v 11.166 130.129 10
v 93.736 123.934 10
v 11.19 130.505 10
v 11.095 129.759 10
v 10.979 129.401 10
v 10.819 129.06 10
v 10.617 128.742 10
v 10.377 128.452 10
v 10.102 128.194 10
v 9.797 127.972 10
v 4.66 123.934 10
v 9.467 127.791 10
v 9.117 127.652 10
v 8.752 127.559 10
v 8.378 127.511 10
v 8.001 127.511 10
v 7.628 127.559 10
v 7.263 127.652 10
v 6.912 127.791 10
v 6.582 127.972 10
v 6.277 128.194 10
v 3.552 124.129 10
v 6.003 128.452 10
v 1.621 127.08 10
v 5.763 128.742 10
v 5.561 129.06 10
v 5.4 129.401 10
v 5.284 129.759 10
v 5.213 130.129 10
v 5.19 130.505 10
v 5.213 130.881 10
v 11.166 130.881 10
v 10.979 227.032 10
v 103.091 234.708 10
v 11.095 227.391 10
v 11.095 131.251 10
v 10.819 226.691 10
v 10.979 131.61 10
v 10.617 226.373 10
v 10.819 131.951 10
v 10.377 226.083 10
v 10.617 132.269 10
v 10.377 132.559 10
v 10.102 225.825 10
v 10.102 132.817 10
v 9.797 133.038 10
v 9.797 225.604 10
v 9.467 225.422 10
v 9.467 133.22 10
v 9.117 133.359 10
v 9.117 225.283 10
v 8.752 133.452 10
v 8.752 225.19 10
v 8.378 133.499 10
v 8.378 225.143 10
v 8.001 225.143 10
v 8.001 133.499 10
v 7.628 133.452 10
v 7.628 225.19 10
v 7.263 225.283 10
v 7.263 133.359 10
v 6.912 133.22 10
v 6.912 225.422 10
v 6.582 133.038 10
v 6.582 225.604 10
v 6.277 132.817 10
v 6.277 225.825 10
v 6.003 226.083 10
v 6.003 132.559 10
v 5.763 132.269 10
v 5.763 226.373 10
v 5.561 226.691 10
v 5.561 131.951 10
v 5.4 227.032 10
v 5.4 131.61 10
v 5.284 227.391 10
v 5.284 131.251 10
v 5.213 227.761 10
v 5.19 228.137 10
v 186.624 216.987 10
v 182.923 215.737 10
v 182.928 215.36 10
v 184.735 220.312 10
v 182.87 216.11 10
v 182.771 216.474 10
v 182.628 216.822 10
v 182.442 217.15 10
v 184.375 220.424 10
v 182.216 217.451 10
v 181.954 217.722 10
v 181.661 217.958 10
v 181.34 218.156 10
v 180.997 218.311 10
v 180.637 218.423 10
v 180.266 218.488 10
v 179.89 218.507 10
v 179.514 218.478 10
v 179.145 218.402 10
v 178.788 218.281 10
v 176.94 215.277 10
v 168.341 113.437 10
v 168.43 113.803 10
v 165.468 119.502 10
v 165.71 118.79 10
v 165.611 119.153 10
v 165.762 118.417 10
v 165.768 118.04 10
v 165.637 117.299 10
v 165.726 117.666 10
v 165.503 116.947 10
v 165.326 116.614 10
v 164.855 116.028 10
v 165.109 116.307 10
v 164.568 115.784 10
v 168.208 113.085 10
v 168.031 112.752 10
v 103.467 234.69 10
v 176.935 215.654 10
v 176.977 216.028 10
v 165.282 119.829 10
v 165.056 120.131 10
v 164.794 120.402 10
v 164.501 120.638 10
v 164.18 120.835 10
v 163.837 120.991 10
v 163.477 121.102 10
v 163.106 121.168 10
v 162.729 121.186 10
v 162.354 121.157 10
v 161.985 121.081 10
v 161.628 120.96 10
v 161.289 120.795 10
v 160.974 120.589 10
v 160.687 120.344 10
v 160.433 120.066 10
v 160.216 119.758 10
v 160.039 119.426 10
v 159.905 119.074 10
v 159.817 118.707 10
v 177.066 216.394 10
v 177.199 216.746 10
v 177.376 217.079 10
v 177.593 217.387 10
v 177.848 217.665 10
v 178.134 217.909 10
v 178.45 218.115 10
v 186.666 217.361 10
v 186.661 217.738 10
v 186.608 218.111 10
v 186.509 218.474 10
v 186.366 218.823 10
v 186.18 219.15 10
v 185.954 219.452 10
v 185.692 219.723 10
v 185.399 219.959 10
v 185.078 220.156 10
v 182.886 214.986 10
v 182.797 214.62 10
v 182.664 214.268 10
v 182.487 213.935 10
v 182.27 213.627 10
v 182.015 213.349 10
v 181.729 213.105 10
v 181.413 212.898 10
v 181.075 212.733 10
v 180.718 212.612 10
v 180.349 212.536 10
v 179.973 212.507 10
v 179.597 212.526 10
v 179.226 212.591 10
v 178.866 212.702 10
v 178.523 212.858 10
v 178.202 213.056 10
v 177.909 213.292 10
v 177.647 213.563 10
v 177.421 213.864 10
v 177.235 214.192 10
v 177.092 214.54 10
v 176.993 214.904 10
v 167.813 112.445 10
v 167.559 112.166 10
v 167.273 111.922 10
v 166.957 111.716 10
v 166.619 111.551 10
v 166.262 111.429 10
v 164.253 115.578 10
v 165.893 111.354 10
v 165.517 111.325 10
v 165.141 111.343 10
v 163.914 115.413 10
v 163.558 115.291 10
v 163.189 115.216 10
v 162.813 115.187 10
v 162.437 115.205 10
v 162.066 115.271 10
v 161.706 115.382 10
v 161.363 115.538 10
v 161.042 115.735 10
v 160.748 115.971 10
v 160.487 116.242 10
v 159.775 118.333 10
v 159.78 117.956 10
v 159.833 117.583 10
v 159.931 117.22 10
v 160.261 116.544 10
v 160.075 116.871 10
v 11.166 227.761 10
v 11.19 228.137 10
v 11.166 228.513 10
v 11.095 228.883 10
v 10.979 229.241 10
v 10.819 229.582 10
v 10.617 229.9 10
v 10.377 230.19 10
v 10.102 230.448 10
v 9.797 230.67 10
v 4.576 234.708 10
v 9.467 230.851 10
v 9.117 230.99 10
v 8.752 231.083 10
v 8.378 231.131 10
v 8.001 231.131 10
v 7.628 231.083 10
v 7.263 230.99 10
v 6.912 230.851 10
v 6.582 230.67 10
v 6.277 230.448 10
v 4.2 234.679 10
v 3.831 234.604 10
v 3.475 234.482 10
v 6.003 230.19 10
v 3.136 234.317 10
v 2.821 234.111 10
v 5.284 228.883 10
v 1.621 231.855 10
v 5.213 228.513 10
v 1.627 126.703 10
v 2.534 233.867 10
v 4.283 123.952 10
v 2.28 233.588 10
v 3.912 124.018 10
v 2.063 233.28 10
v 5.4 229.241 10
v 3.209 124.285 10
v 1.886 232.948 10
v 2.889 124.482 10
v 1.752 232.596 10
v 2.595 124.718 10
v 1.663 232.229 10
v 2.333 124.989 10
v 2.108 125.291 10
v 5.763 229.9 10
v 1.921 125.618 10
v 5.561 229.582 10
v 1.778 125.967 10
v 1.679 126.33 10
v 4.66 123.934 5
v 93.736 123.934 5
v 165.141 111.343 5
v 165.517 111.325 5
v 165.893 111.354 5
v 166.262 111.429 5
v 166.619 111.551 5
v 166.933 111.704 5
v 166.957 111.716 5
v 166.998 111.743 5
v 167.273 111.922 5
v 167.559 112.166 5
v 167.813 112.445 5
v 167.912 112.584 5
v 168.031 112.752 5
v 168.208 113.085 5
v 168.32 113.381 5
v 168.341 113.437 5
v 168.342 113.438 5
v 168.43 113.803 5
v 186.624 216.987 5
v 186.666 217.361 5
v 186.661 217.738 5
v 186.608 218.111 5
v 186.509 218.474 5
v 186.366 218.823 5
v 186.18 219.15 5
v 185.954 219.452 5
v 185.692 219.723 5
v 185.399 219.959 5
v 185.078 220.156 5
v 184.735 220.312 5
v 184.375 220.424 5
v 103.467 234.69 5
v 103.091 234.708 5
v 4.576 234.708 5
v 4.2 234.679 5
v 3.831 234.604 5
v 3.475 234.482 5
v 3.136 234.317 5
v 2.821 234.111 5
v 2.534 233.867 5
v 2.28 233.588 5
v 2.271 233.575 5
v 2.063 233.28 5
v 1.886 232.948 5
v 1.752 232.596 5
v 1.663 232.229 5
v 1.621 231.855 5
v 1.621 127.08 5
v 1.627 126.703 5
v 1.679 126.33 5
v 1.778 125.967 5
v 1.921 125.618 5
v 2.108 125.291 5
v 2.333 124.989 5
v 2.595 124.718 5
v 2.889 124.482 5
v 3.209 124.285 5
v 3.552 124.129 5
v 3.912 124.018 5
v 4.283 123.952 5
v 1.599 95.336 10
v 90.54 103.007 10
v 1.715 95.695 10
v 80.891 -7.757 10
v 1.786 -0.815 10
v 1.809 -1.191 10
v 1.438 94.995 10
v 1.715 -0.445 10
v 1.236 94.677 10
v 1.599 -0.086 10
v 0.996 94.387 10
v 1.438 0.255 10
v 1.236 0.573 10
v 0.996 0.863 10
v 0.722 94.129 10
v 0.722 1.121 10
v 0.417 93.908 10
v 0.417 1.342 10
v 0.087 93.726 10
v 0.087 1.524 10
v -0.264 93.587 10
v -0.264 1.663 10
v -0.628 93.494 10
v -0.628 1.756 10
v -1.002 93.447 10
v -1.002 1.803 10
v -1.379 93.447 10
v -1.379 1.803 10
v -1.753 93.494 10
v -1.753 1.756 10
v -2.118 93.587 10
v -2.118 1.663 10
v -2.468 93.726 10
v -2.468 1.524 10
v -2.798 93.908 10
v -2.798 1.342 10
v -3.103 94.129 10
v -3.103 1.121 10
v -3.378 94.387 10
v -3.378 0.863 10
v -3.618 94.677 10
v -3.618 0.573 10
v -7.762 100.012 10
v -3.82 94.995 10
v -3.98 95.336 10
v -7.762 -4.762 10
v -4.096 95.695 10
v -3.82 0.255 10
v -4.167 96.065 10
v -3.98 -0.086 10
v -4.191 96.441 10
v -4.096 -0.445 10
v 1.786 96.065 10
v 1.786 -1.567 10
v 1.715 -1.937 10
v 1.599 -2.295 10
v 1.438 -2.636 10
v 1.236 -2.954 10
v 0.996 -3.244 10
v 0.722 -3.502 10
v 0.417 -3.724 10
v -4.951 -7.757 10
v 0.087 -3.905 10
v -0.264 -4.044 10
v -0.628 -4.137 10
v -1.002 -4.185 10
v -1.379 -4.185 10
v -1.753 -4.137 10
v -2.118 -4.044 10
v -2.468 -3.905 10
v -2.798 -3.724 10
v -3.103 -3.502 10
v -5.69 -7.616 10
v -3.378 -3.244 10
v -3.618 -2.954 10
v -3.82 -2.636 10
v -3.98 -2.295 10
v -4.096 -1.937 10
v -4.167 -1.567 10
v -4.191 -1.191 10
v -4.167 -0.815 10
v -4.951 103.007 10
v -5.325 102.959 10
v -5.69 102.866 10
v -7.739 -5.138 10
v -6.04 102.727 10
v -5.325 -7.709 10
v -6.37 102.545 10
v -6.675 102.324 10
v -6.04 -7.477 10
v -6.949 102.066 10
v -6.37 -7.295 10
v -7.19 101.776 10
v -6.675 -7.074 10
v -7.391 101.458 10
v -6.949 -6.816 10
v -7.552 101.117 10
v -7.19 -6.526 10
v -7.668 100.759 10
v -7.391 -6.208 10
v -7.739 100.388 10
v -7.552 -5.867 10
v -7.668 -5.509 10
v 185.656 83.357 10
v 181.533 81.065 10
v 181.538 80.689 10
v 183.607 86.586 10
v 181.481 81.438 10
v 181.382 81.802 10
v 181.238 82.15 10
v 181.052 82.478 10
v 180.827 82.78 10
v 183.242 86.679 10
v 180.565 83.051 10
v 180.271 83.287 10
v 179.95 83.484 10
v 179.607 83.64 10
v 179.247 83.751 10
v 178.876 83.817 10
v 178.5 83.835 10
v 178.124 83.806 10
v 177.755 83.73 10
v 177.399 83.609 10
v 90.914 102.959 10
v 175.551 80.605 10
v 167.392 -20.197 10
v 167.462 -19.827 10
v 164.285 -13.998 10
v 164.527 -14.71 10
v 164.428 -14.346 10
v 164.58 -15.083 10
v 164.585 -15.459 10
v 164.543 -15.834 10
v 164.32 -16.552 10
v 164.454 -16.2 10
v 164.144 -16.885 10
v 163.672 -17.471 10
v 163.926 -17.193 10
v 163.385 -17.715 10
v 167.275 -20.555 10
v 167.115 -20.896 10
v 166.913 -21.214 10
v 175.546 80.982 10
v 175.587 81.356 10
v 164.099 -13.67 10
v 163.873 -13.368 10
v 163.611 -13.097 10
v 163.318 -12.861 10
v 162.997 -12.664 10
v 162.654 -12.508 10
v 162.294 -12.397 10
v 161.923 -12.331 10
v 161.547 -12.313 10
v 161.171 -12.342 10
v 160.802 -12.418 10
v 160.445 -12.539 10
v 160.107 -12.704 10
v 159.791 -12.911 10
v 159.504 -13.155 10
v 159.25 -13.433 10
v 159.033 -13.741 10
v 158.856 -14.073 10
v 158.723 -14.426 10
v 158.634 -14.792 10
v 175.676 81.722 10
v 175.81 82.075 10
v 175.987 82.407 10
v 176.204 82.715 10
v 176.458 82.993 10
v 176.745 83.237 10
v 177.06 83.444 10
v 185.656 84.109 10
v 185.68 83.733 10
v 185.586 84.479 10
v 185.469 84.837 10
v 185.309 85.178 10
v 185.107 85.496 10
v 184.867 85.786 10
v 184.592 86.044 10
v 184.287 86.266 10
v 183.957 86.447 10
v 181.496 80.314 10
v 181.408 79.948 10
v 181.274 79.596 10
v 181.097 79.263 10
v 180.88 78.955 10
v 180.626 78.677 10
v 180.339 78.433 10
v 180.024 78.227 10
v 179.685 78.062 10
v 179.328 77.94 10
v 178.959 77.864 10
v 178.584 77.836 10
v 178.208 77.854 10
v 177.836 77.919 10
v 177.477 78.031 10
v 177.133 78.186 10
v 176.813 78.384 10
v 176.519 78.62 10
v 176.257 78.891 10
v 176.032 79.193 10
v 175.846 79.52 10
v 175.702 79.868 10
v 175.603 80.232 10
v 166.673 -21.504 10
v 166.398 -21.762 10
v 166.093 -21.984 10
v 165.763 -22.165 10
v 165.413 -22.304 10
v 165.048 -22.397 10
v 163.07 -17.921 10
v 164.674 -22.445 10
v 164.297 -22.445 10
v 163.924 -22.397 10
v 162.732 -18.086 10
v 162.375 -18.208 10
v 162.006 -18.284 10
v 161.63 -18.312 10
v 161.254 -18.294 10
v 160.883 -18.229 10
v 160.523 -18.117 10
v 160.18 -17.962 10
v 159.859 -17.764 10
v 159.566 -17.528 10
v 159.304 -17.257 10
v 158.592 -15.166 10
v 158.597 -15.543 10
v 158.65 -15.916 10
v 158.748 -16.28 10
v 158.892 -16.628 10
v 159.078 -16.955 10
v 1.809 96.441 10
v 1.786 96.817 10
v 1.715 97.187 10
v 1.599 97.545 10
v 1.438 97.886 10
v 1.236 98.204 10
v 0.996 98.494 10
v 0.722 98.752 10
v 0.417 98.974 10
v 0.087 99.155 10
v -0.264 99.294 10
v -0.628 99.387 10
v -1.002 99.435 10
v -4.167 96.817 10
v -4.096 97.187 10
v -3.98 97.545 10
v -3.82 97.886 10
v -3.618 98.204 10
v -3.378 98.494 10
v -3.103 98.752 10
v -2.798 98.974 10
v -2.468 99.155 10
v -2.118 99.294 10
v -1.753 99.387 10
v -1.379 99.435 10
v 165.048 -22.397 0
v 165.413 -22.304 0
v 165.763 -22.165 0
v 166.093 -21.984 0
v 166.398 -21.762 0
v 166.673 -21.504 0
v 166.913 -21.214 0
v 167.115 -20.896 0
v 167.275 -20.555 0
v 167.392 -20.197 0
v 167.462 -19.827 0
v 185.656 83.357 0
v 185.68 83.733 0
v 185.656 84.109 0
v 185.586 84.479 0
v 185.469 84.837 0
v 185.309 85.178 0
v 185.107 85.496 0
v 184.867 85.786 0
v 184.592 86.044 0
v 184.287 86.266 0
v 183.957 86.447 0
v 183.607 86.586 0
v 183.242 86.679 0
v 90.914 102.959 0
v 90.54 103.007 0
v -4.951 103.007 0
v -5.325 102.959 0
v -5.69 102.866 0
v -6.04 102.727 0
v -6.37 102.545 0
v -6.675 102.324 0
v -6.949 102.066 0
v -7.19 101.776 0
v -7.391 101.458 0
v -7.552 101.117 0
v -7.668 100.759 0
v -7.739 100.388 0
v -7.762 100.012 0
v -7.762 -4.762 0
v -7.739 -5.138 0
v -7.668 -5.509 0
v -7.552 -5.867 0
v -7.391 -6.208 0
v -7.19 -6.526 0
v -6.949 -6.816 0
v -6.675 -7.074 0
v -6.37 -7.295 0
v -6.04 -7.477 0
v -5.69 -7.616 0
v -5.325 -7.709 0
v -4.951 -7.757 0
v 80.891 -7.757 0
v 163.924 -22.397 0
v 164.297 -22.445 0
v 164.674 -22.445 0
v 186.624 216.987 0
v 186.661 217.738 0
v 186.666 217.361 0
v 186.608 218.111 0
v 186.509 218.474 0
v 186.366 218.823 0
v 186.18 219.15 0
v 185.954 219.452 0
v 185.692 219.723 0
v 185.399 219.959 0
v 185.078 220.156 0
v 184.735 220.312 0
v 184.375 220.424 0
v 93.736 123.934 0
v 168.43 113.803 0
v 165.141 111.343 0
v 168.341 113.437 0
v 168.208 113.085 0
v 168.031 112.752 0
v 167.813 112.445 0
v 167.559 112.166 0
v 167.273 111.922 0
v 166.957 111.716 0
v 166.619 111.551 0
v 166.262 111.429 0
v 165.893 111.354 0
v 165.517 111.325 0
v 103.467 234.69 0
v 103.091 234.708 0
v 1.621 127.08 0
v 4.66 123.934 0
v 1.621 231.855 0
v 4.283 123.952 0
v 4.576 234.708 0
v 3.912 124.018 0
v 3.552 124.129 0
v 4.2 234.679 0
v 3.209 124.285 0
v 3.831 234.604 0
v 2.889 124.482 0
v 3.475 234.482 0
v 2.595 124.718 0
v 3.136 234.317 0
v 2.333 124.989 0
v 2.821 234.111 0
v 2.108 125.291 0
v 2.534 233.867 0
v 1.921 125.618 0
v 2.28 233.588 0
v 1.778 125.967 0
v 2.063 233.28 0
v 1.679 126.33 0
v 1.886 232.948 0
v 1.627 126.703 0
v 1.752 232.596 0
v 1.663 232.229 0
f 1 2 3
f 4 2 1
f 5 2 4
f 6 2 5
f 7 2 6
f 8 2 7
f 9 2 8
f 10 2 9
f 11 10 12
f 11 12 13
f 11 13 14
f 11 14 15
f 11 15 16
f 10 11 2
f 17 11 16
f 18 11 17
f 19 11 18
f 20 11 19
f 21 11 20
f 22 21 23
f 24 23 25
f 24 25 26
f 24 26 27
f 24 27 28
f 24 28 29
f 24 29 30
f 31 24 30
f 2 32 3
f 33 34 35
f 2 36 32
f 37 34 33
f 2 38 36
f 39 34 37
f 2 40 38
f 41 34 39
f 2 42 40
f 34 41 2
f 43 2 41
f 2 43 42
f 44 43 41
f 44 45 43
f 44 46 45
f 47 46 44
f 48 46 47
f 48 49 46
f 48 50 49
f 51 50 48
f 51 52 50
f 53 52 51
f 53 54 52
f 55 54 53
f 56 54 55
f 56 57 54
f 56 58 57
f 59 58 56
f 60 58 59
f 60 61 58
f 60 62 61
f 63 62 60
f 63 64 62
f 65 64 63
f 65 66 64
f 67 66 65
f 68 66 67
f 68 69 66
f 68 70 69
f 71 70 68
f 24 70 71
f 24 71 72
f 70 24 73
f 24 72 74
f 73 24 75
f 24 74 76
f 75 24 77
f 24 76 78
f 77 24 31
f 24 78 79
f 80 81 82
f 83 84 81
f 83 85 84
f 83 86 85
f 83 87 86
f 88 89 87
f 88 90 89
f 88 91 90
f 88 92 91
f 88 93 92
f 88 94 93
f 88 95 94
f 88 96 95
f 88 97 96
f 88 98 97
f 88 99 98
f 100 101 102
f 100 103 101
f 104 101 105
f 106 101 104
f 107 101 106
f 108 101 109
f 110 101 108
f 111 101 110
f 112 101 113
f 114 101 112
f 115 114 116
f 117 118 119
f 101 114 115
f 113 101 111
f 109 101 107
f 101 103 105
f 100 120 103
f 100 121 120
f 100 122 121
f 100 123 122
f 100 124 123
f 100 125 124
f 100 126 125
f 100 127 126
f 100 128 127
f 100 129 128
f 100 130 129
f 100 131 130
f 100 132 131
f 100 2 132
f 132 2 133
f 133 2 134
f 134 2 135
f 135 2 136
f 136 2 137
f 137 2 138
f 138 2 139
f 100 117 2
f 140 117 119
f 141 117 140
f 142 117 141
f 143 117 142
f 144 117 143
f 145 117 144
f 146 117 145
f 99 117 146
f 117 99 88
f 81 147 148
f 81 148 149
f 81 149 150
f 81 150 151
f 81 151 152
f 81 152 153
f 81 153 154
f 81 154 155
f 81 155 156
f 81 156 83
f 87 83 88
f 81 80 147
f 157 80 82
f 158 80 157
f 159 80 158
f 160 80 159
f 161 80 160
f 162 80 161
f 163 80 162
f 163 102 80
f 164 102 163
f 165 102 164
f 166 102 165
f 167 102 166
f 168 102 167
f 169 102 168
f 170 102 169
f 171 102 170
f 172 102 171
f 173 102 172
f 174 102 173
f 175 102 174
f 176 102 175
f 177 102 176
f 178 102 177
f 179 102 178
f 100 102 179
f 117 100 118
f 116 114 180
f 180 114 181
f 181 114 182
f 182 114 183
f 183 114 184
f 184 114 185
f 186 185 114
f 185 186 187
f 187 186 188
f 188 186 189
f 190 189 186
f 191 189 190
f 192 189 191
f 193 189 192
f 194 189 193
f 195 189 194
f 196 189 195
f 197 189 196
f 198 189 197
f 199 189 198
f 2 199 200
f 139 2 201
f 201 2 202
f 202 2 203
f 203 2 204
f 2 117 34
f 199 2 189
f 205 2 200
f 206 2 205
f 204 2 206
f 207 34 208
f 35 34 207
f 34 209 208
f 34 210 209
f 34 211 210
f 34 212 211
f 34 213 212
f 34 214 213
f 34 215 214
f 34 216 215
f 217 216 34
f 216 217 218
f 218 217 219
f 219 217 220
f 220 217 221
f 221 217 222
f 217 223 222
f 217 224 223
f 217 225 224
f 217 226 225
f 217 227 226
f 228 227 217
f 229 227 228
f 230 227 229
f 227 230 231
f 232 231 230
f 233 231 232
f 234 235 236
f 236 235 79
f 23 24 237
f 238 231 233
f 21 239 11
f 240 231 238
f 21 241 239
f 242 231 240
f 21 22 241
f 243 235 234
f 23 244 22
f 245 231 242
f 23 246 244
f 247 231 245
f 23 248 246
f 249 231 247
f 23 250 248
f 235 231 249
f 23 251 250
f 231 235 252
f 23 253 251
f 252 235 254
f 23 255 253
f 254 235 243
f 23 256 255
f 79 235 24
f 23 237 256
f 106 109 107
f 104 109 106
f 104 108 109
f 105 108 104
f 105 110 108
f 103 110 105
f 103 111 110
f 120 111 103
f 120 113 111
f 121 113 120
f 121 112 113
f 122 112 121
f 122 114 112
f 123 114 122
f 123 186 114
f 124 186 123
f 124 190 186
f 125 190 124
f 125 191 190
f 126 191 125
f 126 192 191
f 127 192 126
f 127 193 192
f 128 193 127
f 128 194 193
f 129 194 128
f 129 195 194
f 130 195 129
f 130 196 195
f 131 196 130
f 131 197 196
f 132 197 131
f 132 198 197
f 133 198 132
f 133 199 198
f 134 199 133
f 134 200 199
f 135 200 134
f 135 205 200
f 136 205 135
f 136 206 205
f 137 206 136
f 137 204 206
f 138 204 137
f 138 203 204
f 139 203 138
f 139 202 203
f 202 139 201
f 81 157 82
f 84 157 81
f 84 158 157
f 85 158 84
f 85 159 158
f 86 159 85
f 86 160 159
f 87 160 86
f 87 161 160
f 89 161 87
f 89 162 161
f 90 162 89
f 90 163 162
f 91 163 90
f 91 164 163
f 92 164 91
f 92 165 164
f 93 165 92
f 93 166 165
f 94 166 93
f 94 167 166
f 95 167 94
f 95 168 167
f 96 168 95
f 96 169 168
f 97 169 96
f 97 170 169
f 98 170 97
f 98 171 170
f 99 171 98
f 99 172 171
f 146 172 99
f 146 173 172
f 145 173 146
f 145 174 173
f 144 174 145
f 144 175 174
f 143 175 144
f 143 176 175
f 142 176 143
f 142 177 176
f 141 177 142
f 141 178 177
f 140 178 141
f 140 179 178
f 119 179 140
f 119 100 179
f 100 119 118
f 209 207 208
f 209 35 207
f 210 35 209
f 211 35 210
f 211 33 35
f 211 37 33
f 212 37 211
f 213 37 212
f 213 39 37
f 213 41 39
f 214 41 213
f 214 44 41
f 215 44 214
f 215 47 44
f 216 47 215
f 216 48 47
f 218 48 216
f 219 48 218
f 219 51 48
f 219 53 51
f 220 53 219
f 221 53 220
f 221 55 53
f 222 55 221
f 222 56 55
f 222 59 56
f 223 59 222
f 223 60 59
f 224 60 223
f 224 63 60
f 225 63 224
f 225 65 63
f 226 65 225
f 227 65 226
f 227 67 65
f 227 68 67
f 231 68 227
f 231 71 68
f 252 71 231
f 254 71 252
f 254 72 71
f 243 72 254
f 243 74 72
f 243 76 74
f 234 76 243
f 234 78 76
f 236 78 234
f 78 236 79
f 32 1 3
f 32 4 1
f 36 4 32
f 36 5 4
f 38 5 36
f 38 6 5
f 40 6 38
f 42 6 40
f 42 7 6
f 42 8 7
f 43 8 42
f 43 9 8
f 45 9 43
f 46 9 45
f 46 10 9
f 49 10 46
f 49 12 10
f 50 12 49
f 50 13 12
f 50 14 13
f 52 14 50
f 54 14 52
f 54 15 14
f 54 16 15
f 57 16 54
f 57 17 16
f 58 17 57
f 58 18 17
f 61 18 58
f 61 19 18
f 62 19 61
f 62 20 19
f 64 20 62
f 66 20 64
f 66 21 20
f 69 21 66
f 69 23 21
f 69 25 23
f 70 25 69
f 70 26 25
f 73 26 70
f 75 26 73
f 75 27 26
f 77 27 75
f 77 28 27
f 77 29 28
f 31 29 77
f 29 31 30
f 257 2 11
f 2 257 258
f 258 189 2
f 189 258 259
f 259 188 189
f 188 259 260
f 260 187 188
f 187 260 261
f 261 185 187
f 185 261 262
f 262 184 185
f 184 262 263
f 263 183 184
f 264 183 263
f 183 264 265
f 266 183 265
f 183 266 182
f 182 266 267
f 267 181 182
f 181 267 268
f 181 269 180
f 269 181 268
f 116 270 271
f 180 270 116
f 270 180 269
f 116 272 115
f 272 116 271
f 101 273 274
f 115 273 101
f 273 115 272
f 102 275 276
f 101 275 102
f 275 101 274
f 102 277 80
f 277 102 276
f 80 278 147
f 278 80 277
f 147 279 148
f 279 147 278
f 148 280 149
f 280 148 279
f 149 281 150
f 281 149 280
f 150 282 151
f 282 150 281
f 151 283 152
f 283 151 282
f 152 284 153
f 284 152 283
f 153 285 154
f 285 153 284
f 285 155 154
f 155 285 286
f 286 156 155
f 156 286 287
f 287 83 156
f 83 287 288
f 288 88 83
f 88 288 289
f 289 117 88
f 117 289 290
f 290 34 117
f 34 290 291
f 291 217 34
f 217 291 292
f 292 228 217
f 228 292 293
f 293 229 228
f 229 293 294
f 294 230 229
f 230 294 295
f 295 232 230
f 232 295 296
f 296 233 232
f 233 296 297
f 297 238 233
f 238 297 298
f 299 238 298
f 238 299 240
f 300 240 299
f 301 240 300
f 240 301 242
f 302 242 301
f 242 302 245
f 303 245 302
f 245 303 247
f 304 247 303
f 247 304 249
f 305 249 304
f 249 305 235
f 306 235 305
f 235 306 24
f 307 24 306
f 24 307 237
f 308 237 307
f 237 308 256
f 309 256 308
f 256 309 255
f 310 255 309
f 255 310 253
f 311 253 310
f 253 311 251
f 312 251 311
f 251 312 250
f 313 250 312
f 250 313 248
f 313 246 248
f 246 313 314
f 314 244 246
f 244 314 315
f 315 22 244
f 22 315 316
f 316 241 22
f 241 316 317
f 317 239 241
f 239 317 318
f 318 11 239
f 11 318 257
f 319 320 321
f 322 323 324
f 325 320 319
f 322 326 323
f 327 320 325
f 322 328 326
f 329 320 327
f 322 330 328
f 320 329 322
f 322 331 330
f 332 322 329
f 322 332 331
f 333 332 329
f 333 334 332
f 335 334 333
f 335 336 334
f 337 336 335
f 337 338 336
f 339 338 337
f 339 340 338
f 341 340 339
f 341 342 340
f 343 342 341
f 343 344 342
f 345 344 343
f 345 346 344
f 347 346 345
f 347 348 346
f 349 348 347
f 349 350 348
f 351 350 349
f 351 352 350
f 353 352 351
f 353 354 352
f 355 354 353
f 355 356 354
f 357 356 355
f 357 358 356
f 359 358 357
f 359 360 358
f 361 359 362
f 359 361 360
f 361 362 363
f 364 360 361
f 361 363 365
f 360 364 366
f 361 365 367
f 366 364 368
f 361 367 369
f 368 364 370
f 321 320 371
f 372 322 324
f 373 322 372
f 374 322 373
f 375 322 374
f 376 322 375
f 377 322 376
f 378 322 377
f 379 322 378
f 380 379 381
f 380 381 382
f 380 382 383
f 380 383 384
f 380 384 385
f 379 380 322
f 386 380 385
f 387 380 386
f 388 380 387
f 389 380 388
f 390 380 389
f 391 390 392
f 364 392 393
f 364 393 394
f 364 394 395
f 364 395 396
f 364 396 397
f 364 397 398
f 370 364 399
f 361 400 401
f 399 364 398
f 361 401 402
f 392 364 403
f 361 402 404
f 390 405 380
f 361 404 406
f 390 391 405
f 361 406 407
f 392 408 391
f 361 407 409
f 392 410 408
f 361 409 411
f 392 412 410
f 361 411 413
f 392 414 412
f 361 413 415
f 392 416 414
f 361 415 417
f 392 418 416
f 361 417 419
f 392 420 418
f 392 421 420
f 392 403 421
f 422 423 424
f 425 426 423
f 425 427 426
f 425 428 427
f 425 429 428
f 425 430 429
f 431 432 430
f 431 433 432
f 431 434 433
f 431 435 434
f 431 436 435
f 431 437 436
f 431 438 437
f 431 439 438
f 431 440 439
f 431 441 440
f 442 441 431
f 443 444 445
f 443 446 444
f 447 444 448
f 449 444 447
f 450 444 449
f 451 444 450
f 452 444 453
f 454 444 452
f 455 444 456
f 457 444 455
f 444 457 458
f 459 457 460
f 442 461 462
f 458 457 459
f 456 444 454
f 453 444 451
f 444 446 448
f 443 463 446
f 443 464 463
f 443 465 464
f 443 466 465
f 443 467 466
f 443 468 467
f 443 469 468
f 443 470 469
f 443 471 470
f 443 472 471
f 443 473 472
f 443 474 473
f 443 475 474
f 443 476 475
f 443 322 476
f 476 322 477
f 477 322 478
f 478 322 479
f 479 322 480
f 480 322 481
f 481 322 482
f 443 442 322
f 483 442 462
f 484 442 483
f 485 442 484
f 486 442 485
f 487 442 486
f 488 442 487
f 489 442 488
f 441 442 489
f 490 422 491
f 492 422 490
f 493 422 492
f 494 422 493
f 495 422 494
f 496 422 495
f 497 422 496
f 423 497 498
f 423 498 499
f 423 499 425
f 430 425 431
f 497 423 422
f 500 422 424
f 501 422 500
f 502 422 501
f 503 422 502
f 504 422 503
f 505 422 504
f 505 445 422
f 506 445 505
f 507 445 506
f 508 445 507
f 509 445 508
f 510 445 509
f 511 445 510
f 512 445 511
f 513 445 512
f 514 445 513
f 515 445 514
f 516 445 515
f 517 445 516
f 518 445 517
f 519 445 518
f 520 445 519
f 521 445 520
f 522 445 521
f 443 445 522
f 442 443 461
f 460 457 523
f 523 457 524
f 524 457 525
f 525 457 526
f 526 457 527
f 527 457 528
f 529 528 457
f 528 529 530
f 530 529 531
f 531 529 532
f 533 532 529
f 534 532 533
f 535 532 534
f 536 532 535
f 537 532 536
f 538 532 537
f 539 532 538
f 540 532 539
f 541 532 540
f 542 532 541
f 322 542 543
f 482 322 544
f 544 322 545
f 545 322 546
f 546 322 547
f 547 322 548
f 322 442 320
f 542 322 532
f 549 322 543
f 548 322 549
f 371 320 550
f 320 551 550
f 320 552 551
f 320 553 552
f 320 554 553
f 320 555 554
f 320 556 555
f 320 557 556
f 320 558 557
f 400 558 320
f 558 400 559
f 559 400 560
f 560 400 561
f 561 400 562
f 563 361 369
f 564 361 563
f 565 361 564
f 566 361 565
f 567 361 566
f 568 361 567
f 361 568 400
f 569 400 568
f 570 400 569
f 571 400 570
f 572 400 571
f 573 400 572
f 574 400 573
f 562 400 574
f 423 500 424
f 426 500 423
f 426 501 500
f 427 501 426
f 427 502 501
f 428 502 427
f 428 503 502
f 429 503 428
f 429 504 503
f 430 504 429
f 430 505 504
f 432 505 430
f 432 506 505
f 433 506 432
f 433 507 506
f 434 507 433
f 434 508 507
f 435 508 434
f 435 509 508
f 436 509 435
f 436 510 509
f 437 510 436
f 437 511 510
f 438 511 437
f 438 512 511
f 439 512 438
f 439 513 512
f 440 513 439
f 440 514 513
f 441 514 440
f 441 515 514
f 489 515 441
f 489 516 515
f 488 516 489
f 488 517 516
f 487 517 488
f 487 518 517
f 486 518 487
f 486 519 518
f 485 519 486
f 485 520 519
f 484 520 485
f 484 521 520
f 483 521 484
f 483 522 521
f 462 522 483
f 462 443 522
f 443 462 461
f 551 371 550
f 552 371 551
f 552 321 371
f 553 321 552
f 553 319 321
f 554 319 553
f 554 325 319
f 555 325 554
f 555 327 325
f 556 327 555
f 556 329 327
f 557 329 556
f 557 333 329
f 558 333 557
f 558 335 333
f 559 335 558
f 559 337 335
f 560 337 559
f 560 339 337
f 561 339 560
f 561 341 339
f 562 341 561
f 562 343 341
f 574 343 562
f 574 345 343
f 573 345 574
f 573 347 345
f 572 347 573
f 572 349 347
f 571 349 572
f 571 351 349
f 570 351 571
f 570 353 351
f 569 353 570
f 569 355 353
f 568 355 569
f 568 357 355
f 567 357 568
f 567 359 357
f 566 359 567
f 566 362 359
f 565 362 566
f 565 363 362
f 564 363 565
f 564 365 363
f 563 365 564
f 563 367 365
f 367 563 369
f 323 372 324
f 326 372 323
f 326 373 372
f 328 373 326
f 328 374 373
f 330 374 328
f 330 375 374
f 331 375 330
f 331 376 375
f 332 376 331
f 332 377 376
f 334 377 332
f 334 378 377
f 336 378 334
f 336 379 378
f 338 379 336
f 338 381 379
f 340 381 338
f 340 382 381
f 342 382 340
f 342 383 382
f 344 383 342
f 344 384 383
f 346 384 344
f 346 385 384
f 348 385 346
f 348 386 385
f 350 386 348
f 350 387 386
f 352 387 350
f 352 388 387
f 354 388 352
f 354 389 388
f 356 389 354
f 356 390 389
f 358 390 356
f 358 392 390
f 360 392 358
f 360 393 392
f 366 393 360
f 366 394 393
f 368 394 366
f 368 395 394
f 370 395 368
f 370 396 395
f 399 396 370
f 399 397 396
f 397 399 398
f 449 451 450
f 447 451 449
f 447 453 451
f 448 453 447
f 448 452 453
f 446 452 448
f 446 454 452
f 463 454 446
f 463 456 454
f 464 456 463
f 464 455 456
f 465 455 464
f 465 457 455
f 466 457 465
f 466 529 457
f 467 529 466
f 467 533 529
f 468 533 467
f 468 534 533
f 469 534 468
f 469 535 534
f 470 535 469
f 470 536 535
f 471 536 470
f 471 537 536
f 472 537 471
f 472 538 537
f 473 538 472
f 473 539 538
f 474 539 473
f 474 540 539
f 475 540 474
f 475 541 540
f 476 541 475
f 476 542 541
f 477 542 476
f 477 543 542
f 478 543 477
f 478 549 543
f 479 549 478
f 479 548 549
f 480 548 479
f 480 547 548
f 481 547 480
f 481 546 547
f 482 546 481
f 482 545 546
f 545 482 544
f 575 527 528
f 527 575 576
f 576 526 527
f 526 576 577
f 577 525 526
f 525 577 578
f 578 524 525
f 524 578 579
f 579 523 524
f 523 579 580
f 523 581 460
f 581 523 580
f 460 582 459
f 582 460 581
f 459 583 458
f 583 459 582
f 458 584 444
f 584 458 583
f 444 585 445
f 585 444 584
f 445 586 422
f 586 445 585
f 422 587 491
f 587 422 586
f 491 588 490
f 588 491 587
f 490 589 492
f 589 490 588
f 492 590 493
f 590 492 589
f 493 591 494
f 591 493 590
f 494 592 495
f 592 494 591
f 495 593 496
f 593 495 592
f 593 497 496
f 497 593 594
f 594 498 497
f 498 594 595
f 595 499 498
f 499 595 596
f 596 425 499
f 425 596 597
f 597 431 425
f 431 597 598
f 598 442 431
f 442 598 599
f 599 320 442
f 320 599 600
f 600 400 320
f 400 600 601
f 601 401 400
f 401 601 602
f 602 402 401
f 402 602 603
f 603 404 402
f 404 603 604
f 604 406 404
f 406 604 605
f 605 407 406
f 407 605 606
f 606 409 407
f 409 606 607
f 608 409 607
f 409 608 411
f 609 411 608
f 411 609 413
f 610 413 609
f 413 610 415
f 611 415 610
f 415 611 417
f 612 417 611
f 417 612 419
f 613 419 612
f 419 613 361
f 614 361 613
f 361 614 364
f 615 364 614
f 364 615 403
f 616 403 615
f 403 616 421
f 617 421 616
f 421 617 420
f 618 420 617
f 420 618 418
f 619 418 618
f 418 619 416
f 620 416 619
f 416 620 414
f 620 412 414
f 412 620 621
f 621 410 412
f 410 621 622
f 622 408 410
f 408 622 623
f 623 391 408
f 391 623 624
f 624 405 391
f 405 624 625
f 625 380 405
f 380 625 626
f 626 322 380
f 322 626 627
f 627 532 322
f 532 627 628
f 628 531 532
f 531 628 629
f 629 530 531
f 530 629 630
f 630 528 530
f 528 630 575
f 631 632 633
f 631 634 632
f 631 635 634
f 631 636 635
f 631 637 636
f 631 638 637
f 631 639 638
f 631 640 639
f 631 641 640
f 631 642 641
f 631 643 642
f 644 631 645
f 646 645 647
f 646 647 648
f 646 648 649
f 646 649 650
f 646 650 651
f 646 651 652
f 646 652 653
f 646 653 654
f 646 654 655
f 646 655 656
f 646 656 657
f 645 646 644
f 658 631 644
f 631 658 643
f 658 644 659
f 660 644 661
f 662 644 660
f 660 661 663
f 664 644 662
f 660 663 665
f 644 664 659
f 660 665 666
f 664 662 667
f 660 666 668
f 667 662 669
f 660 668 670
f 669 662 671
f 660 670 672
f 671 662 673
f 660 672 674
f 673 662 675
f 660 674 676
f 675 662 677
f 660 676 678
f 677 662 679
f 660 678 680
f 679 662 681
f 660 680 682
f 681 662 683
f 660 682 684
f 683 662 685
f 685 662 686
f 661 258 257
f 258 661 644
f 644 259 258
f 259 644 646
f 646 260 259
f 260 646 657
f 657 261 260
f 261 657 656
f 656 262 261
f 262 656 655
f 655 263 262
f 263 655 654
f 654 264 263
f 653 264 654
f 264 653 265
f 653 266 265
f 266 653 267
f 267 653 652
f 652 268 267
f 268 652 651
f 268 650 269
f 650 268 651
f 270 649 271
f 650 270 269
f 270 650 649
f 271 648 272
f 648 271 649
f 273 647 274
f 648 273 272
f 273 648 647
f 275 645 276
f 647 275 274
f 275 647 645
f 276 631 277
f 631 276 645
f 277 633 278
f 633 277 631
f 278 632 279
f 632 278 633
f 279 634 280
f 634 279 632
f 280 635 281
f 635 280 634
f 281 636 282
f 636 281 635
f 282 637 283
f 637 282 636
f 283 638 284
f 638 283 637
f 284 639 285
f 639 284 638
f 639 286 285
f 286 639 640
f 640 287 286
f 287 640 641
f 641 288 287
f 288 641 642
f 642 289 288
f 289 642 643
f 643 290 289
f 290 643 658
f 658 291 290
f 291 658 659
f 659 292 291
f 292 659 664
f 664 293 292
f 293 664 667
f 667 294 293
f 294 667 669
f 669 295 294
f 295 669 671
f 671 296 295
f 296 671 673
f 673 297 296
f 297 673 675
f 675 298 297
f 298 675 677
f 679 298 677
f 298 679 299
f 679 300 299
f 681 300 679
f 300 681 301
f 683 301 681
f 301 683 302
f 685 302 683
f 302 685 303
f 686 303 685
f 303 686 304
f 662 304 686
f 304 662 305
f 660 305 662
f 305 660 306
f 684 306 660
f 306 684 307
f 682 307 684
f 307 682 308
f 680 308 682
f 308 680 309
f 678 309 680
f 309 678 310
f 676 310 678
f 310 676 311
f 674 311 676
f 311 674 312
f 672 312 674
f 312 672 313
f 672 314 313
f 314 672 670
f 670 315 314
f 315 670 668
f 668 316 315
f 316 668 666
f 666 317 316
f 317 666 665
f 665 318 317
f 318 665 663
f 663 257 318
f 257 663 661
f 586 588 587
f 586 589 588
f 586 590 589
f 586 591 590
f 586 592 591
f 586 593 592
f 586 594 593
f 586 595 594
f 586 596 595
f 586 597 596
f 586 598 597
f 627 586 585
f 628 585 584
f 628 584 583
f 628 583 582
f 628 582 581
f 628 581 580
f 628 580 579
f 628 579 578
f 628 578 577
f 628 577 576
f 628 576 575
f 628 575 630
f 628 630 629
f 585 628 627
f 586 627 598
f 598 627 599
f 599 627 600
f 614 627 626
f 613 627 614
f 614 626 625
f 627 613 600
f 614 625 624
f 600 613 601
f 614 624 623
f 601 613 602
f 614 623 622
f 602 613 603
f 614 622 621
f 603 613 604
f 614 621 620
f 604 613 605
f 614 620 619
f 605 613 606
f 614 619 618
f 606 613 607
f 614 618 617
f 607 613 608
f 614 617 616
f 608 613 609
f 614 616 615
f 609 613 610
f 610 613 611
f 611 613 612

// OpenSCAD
// file: constraints.scad
// Format: #u, count
keycaps = [[1, 60], [1.25, 7], [1.5, 2], [1.75, 2],
           [2, 0],  [2.25, 1], [2.5, 0], [2.75, 1], [3, 0]];

function sum(row, i = 0, sum_so_far = 0) = len(row) == i ? sum_so_far : sum(row, i+1, sum_so_far+row[i]);

function mask_keys_matching(clusters, key_width) =
    [for (cluster = clusters)
       for (row = cluster)
           for (key_index = [1:len(cluster)-1])
               (row[key_index] == key_width) ? 1 : 0];

function check_constraints(clusters) =
    let (counts = [ for (keycap_count = keycaps)
                        let (key_width = keycap_count[0],
                             matches = mask_keys_matching(clusters, key_width))
                            sum(matches)])
        [ for (i = [0:len(keycaps)-1]) assert(keycaps[i][1] >= counts[i], str("Keycap size ", keycaps[i][0], ": ", "Found ", counts[i], " but only have ", keycaps[i][1], "."))];
// file: const.scad
KNOB_LEFT = 1;
KNOB_RIGHT = 2;

TYPE_A = "A";
TYPE_B = "B";
TYPE_C = "C";
TYPE_D = "D";
// main file
include <base.scad>;
right(TYPE_D);

translate([0, 0, PLATE_HEIGHT])
    right(TYPE_C);

left(TYPE_D);

translate([0, 0, PLATE_HEIGHT])
    left(TYPE_C);
